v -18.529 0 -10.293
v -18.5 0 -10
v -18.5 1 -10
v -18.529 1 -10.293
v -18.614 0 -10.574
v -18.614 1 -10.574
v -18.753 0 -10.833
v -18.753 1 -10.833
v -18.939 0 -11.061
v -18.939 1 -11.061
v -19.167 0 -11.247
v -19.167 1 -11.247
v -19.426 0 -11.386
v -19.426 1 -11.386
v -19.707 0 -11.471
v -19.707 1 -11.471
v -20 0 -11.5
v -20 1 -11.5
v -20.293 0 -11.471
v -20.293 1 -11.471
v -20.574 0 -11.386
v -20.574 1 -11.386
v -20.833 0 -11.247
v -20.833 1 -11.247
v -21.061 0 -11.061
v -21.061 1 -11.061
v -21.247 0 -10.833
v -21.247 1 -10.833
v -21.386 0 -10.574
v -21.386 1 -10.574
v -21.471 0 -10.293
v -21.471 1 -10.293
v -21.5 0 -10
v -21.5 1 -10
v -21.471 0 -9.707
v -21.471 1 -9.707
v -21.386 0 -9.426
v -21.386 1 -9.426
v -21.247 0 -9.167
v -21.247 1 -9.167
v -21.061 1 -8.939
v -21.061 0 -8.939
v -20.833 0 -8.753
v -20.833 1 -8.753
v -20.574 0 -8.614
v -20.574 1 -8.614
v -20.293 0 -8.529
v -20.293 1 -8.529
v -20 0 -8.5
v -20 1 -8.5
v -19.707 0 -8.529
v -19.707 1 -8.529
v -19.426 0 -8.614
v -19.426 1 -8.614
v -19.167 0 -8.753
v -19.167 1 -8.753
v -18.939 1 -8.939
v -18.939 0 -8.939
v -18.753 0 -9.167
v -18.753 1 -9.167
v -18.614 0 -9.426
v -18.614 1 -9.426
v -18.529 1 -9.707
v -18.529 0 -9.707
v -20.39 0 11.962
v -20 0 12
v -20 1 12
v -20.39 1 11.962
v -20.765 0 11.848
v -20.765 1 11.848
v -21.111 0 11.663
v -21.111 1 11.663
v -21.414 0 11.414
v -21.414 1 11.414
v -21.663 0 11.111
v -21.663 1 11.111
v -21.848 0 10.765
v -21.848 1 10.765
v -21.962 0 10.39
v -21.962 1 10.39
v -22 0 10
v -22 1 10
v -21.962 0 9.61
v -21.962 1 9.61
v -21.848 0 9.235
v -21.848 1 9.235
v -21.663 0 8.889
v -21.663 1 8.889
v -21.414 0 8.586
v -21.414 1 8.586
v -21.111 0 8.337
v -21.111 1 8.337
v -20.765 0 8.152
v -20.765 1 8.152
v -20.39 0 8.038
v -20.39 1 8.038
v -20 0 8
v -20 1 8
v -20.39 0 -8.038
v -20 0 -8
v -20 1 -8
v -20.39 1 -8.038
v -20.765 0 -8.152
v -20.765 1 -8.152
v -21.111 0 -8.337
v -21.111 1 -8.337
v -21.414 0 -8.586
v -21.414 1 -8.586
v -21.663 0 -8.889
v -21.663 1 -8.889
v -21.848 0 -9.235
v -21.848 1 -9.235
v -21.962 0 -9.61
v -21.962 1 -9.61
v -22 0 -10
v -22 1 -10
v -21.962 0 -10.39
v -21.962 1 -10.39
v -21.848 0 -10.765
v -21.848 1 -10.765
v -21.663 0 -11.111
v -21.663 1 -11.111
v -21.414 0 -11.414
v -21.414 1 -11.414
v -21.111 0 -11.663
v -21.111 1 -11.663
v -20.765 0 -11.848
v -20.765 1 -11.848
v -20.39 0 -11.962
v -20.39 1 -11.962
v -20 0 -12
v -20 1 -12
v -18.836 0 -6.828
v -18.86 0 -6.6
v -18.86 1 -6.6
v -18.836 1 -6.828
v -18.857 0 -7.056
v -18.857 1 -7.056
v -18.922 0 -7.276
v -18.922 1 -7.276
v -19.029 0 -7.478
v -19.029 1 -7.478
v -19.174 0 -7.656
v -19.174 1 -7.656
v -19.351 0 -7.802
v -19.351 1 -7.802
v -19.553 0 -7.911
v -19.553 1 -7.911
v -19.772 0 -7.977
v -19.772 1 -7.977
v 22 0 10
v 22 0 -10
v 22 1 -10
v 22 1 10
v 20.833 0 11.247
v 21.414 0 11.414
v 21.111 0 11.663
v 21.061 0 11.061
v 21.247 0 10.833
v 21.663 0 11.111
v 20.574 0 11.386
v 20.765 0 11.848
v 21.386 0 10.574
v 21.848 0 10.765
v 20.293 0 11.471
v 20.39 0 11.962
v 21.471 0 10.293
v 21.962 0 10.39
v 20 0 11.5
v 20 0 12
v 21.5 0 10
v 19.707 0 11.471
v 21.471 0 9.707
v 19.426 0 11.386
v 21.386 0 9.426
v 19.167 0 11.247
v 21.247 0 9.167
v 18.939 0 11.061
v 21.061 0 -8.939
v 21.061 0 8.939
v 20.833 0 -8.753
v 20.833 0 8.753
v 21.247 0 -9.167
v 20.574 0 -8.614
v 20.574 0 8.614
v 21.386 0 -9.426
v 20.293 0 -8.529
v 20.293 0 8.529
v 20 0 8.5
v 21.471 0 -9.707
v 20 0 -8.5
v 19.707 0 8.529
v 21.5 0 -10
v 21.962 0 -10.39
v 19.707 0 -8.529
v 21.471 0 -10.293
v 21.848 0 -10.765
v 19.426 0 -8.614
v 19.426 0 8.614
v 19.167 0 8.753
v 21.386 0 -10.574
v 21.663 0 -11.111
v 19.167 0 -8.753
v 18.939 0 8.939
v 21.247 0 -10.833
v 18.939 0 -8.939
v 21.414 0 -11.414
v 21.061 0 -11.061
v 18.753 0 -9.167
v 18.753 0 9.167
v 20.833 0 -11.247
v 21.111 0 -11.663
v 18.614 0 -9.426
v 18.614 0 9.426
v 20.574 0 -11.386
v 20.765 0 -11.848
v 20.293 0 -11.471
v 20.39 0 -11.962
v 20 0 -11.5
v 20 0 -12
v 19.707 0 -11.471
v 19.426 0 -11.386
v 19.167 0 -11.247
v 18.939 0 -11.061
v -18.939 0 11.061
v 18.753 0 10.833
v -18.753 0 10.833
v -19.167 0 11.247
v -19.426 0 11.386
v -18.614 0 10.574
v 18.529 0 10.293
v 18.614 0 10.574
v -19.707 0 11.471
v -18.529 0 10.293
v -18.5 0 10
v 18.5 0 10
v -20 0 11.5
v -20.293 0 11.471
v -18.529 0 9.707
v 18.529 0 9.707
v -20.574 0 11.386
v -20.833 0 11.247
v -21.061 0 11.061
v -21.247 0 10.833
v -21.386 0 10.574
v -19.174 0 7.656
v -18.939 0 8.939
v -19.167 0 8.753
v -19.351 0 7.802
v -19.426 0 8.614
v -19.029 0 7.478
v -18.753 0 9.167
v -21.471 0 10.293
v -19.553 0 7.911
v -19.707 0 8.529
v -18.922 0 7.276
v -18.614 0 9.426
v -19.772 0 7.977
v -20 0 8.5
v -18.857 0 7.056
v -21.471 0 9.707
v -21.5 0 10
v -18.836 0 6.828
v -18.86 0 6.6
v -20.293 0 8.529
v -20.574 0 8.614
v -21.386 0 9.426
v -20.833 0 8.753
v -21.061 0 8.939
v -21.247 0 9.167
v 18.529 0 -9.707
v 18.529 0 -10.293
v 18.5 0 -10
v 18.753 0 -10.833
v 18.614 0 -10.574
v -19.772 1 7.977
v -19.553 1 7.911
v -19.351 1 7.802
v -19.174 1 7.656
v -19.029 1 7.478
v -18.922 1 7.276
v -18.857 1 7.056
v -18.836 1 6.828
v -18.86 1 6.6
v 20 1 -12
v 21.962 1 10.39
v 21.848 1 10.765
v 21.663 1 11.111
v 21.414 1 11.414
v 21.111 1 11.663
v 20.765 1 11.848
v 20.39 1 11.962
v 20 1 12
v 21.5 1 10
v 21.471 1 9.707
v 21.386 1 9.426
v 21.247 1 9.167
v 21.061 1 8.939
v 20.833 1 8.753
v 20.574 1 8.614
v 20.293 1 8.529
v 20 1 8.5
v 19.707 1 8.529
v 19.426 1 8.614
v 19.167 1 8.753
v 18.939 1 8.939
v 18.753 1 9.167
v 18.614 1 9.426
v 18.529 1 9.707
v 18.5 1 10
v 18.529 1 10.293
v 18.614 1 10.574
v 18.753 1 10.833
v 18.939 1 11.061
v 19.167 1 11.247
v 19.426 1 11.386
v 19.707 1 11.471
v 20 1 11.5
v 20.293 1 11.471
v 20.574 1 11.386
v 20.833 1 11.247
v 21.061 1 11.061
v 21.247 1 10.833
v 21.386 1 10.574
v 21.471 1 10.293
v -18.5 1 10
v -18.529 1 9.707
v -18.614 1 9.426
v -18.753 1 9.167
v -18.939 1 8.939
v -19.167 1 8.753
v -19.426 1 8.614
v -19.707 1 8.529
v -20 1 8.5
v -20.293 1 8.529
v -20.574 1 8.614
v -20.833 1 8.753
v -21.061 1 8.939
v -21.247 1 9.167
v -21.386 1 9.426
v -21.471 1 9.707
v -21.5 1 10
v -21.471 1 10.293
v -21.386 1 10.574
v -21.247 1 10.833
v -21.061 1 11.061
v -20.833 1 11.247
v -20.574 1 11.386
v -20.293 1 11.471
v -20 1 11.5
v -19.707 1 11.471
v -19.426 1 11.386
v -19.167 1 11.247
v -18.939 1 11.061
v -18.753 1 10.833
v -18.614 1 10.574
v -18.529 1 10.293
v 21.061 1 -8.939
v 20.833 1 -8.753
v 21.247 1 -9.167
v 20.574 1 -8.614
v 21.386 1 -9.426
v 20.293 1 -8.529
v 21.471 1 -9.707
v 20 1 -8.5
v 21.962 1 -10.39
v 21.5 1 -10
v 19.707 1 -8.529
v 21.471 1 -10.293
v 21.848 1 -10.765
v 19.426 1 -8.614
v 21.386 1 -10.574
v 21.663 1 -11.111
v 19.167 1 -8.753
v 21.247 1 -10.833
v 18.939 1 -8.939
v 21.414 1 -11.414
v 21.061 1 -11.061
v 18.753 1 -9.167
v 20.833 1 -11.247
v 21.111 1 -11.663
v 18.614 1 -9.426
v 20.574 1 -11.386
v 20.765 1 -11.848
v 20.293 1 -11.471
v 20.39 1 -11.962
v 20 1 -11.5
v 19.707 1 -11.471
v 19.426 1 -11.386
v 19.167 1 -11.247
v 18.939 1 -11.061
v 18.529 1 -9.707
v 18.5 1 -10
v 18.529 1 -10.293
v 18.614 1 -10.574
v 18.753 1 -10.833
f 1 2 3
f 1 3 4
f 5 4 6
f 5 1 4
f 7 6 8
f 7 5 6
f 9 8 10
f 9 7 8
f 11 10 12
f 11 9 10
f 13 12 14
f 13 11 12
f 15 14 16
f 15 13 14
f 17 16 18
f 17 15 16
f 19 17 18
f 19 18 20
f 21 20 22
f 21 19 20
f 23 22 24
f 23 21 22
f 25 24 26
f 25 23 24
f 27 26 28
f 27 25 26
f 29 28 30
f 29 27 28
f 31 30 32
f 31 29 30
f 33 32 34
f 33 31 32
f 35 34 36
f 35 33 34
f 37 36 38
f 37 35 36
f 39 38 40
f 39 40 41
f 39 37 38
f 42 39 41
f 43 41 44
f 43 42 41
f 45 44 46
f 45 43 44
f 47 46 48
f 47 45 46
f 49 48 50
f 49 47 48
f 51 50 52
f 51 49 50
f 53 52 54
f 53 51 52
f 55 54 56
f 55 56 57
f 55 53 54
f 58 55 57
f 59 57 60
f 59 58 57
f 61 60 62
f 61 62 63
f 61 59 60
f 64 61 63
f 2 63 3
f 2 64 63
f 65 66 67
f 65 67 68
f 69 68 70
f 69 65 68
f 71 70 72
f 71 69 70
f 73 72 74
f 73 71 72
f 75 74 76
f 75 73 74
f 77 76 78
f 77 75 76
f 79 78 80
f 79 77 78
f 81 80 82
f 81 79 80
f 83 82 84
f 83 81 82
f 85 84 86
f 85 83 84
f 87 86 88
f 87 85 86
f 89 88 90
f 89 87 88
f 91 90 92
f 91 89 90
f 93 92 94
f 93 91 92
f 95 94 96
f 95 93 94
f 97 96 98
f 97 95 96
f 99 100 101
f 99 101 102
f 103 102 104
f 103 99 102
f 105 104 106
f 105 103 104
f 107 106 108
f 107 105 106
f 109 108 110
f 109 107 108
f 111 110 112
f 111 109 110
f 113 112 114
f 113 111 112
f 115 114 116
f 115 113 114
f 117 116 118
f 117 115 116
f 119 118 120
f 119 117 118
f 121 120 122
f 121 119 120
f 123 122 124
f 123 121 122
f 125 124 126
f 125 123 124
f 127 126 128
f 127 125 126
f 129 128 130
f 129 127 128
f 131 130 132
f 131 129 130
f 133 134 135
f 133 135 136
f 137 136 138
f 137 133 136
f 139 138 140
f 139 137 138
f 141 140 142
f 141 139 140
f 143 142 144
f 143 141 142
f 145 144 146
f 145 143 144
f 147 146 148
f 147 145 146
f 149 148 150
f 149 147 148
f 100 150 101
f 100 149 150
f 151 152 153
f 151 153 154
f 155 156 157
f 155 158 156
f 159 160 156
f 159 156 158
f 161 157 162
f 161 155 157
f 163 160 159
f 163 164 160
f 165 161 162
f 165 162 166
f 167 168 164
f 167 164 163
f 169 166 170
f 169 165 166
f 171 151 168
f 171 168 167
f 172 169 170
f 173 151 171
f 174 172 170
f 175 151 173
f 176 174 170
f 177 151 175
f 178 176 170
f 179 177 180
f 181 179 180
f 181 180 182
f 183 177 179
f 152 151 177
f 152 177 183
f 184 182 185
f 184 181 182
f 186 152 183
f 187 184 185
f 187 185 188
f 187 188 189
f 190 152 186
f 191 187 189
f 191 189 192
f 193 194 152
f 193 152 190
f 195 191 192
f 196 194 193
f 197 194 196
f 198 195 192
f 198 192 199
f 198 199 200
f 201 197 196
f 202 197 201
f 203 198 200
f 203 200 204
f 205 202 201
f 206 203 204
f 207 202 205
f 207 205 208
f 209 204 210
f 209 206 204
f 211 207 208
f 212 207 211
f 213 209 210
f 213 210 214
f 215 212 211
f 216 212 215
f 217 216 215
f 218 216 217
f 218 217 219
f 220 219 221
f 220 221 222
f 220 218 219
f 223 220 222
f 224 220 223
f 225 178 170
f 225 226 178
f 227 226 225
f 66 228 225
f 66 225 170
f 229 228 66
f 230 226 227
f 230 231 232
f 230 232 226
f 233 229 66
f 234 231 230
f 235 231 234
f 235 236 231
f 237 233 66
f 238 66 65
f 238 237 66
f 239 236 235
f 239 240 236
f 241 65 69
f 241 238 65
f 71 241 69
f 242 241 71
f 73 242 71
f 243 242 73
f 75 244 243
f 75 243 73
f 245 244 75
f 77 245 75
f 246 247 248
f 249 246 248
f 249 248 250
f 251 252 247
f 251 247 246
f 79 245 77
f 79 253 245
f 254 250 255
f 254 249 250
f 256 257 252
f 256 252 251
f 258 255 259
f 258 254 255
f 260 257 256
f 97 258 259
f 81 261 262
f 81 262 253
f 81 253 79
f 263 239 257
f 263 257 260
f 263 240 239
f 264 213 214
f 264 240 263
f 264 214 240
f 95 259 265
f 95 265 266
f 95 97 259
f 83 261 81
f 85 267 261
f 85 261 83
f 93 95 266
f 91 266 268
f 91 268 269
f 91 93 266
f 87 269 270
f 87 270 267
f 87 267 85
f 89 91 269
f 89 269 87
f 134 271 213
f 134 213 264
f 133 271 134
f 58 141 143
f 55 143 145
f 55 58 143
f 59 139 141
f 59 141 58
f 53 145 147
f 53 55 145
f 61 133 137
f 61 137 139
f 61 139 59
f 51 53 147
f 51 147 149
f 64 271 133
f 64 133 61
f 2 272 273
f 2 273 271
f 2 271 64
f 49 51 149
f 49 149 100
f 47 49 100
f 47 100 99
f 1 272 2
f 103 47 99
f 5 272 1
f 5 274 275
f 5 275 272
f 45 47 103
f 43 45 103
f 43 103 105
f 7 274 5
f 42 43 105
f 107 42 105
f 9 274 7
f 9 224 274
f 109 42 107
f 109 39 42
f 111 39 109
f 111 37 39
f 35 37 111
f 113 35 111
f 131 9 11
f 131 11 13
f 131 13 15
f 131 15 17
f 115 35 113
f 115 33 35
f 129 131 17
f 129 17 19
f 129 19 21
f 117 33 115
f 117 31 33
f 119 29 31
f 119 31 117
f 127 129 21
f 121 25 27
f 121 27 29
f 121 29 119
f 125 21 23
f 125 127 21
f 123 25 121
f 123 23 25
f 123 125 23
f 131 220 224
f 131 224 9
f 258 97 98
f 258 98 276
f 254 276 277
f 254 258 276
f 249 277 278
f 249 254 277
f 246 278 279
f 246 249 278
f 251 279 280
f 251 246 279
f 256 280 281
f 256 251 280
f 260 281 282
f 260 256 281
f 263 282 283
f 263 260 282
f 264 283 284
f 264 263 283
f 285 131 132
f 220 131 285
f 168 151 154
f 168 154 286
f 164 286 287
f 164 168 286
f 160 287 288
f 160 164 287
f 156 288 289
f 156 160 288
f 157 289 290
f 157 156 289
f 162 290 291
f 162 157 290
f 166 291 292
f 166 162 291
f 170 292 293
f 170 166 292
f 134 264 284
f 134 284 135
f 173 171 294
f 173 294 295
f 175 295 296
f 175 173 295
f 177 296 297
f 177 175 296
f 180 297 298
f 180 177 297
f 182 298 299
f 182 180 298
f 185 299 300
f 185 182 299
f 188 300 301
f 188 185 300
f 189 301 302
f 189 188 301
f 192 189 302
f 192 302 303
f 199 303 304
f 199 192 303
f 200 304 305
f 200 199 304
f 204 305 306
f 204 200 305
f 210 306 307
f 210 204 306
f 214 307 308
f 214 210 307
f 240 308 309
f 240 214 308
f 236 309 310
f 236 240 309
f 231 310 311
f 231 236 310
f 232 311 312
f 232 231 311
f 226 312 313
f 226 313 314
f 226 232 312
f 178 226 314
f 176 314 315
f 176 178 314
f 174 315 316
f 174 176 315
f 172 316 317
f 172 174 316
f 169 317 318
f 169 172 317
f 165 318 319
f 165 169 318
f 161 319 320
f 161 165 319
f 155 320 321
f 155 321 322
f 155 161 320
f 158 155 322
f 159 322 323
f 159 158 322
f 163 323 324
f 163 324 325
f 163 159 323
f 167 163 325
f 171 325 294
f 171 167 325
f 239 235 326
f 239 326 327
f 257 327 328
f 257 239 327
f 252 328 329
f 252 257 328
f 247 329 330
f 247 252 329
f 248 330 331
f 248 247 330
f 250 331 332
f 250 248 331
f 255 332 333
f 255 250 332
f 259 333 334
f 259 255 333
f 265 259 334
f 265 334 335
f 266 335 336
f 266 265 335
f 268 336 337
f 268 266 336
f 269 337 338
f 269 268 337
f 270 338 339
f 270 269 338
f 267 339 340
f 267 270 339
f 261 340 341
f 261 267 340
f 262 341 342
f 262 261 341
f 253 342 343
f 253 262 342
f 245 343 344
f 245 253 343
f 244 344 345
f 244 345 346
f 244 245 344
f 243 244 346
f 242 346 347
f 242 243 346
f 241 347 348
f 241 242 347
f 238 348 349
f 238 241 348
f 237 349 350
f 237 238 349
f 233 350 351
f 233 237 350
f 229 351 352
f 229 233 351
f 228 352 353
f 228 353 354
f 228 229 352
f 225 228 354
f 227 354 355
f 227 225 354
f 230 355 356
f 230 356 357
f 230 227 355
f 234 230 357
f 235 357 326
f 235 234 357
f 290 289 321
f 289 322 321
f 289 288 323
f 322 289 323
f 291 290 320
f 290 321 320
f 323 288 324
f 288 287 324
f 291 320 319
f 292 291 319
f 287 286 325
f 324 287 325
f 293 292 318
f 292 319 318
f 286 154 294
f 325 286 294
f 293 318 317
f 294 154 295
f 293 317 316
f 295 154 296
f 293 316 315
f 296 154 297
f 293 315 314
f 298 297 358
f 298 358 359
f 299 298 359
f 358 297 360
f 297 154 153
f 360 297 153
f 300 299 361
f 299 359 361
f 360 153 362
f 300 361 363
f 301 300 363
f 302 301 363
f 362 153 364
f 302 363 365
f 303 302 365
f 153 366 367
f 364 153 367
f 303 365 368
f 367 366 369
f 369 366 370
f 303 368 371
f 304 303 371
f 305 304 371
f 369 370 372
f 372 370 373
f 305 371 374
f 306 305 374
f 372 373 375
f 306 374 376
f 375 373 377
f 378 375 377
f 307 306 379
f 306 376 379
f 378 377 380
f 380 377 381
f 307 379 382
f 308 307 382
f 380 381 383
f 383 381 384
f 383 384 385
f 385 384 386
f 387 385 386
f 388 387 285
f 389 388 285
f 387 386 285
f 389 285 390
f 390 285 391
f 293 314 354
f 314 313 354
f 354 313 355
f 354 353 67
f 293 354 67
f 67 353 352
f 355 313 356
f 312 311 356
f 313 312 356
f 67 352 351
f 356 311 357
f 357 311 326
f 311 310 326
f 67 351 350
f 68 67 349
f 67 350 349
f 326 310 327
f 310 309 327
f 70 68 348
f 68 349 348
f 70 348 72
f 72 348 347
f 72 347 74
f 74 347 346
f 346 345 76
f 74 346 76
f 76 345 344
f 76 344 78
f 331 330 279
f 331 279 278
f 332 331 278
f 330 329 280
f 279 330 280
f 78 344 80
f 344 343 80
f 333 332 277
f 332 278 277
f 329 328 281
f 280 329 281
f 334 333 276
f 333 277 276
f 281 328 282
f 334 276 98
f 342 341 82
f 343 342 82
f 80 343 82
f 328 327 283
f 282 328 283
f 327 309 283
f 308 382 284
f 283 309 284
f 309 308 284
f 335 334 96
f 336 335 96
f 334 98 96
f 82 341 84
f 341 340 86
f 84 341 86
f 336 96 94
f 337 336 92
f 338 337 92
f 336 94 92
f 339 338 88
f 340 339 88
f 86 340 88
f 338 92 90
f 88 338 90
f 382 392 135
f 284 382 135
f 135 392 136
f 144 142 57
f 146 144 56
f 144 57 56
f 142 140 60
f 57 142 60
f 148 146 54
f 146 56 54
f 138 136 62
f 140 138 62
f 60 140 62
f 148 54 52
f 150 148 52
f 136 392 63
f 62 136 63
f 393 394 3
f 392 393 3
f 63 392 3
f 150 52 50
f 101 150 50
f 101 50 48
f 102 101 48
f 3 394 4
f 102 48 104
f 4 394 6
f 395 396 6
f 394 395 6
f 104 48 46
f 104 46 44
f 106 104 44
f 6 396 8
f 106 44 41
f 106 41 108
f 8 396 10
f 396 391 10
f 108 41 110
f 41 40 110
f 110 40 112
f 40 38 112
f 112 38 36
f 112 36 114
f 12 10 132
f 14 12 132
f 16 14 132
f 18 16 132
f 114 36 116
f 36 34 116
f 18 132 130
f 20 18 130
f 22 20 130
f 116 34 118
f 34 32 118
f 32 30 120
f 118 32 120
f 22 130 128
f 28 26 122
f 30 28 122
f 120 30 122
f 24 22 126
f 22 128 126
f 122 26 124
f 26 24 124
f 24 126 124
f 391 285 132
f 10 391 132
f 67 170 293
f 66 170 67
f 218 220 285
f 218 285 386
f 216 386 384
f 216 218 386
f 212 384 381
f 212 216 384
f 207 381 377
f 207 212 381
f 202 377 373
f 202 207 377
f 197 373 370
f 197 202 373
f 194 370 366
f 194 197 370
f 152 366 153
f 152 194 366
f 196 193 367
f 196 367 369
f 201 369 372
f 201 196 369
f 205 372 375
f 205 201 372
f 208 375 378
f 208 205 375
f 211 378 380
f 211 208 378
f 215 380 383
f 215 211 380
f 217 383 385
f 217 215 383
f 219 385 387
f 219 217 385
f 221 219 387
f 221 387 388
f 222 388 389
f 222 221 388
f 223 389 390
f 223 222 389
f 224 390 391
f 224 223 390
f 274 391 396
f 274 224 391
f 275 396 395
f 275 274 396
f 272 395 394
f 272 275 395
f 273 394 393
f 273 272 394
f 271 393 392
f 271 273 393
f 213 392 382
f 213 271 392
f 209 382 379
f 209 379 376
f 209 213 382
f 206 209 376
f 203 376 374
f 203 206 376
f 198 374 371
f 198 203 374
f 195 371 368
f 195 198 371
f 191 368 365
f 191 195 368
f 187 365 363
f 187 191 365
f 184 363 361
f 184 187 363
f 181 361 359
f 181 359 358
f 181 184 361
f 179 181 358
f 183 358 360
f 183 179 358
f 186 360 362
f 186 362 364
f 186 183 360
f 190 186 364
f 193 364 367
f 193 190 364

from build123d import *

# Parameters (mm, degrees)
SKETCH1_R           = 1.5
BOSS_EXTRUDE1_DEPTH = 1


with BuildPart() as part:
    # Sketch1 → Boss-Extrude1 (new body)
    with BuildSketch(Plane(origin=(0, 0, 0), x_dir=(1, 0, 0), z_dir=(0, 1, 0))):
        with BuildLine():
            Line((-20, 12), (20, 12))
            ThreePointArc((20, 12), (21.414213562, 11.414213562), (22, 10))
            Line((22, 10), (22, -10))
            ThreePointArc((22, -10), (21.414213562, -11.414213562), (20, -12))
            Line((20, -12), (-20, -12))
            ThreePointArc((-20, -12), (-22, -10), (-20, -8))
            ThreePointArc((-20, -8), (-19.097281882, -7.57092761), (-18.86, -6.6))
            Line((-18.86, -6.6), (-18.86, 6.6))
            ThreePointArc((-18.86, 6.6), (-19.097281882, 7.57092761), (-20, 8))
            ThreePointArc((-20, 8), (-22, 10), (-20, 12))
        make_face()
        with Locations((-20, 10)):
            Circle(SKETCH1_R, mode=Mode.SUBTRACT)
        with Locations((-20, -10)):
            Circle(SKETCH1_R, mode=Mode.SUBTRACT)
        with Locations((20, -10)):
            Circle(SKETCH1_R, mode=Mode.SUBTRACT)
        with Locations((20, 10)):
            Circle(SKETCH1_R, mode=Mode.SUBTRACT)
    extrude(amount=BOSS_EXTRUDE1_DEPTH)


solid = part.part
